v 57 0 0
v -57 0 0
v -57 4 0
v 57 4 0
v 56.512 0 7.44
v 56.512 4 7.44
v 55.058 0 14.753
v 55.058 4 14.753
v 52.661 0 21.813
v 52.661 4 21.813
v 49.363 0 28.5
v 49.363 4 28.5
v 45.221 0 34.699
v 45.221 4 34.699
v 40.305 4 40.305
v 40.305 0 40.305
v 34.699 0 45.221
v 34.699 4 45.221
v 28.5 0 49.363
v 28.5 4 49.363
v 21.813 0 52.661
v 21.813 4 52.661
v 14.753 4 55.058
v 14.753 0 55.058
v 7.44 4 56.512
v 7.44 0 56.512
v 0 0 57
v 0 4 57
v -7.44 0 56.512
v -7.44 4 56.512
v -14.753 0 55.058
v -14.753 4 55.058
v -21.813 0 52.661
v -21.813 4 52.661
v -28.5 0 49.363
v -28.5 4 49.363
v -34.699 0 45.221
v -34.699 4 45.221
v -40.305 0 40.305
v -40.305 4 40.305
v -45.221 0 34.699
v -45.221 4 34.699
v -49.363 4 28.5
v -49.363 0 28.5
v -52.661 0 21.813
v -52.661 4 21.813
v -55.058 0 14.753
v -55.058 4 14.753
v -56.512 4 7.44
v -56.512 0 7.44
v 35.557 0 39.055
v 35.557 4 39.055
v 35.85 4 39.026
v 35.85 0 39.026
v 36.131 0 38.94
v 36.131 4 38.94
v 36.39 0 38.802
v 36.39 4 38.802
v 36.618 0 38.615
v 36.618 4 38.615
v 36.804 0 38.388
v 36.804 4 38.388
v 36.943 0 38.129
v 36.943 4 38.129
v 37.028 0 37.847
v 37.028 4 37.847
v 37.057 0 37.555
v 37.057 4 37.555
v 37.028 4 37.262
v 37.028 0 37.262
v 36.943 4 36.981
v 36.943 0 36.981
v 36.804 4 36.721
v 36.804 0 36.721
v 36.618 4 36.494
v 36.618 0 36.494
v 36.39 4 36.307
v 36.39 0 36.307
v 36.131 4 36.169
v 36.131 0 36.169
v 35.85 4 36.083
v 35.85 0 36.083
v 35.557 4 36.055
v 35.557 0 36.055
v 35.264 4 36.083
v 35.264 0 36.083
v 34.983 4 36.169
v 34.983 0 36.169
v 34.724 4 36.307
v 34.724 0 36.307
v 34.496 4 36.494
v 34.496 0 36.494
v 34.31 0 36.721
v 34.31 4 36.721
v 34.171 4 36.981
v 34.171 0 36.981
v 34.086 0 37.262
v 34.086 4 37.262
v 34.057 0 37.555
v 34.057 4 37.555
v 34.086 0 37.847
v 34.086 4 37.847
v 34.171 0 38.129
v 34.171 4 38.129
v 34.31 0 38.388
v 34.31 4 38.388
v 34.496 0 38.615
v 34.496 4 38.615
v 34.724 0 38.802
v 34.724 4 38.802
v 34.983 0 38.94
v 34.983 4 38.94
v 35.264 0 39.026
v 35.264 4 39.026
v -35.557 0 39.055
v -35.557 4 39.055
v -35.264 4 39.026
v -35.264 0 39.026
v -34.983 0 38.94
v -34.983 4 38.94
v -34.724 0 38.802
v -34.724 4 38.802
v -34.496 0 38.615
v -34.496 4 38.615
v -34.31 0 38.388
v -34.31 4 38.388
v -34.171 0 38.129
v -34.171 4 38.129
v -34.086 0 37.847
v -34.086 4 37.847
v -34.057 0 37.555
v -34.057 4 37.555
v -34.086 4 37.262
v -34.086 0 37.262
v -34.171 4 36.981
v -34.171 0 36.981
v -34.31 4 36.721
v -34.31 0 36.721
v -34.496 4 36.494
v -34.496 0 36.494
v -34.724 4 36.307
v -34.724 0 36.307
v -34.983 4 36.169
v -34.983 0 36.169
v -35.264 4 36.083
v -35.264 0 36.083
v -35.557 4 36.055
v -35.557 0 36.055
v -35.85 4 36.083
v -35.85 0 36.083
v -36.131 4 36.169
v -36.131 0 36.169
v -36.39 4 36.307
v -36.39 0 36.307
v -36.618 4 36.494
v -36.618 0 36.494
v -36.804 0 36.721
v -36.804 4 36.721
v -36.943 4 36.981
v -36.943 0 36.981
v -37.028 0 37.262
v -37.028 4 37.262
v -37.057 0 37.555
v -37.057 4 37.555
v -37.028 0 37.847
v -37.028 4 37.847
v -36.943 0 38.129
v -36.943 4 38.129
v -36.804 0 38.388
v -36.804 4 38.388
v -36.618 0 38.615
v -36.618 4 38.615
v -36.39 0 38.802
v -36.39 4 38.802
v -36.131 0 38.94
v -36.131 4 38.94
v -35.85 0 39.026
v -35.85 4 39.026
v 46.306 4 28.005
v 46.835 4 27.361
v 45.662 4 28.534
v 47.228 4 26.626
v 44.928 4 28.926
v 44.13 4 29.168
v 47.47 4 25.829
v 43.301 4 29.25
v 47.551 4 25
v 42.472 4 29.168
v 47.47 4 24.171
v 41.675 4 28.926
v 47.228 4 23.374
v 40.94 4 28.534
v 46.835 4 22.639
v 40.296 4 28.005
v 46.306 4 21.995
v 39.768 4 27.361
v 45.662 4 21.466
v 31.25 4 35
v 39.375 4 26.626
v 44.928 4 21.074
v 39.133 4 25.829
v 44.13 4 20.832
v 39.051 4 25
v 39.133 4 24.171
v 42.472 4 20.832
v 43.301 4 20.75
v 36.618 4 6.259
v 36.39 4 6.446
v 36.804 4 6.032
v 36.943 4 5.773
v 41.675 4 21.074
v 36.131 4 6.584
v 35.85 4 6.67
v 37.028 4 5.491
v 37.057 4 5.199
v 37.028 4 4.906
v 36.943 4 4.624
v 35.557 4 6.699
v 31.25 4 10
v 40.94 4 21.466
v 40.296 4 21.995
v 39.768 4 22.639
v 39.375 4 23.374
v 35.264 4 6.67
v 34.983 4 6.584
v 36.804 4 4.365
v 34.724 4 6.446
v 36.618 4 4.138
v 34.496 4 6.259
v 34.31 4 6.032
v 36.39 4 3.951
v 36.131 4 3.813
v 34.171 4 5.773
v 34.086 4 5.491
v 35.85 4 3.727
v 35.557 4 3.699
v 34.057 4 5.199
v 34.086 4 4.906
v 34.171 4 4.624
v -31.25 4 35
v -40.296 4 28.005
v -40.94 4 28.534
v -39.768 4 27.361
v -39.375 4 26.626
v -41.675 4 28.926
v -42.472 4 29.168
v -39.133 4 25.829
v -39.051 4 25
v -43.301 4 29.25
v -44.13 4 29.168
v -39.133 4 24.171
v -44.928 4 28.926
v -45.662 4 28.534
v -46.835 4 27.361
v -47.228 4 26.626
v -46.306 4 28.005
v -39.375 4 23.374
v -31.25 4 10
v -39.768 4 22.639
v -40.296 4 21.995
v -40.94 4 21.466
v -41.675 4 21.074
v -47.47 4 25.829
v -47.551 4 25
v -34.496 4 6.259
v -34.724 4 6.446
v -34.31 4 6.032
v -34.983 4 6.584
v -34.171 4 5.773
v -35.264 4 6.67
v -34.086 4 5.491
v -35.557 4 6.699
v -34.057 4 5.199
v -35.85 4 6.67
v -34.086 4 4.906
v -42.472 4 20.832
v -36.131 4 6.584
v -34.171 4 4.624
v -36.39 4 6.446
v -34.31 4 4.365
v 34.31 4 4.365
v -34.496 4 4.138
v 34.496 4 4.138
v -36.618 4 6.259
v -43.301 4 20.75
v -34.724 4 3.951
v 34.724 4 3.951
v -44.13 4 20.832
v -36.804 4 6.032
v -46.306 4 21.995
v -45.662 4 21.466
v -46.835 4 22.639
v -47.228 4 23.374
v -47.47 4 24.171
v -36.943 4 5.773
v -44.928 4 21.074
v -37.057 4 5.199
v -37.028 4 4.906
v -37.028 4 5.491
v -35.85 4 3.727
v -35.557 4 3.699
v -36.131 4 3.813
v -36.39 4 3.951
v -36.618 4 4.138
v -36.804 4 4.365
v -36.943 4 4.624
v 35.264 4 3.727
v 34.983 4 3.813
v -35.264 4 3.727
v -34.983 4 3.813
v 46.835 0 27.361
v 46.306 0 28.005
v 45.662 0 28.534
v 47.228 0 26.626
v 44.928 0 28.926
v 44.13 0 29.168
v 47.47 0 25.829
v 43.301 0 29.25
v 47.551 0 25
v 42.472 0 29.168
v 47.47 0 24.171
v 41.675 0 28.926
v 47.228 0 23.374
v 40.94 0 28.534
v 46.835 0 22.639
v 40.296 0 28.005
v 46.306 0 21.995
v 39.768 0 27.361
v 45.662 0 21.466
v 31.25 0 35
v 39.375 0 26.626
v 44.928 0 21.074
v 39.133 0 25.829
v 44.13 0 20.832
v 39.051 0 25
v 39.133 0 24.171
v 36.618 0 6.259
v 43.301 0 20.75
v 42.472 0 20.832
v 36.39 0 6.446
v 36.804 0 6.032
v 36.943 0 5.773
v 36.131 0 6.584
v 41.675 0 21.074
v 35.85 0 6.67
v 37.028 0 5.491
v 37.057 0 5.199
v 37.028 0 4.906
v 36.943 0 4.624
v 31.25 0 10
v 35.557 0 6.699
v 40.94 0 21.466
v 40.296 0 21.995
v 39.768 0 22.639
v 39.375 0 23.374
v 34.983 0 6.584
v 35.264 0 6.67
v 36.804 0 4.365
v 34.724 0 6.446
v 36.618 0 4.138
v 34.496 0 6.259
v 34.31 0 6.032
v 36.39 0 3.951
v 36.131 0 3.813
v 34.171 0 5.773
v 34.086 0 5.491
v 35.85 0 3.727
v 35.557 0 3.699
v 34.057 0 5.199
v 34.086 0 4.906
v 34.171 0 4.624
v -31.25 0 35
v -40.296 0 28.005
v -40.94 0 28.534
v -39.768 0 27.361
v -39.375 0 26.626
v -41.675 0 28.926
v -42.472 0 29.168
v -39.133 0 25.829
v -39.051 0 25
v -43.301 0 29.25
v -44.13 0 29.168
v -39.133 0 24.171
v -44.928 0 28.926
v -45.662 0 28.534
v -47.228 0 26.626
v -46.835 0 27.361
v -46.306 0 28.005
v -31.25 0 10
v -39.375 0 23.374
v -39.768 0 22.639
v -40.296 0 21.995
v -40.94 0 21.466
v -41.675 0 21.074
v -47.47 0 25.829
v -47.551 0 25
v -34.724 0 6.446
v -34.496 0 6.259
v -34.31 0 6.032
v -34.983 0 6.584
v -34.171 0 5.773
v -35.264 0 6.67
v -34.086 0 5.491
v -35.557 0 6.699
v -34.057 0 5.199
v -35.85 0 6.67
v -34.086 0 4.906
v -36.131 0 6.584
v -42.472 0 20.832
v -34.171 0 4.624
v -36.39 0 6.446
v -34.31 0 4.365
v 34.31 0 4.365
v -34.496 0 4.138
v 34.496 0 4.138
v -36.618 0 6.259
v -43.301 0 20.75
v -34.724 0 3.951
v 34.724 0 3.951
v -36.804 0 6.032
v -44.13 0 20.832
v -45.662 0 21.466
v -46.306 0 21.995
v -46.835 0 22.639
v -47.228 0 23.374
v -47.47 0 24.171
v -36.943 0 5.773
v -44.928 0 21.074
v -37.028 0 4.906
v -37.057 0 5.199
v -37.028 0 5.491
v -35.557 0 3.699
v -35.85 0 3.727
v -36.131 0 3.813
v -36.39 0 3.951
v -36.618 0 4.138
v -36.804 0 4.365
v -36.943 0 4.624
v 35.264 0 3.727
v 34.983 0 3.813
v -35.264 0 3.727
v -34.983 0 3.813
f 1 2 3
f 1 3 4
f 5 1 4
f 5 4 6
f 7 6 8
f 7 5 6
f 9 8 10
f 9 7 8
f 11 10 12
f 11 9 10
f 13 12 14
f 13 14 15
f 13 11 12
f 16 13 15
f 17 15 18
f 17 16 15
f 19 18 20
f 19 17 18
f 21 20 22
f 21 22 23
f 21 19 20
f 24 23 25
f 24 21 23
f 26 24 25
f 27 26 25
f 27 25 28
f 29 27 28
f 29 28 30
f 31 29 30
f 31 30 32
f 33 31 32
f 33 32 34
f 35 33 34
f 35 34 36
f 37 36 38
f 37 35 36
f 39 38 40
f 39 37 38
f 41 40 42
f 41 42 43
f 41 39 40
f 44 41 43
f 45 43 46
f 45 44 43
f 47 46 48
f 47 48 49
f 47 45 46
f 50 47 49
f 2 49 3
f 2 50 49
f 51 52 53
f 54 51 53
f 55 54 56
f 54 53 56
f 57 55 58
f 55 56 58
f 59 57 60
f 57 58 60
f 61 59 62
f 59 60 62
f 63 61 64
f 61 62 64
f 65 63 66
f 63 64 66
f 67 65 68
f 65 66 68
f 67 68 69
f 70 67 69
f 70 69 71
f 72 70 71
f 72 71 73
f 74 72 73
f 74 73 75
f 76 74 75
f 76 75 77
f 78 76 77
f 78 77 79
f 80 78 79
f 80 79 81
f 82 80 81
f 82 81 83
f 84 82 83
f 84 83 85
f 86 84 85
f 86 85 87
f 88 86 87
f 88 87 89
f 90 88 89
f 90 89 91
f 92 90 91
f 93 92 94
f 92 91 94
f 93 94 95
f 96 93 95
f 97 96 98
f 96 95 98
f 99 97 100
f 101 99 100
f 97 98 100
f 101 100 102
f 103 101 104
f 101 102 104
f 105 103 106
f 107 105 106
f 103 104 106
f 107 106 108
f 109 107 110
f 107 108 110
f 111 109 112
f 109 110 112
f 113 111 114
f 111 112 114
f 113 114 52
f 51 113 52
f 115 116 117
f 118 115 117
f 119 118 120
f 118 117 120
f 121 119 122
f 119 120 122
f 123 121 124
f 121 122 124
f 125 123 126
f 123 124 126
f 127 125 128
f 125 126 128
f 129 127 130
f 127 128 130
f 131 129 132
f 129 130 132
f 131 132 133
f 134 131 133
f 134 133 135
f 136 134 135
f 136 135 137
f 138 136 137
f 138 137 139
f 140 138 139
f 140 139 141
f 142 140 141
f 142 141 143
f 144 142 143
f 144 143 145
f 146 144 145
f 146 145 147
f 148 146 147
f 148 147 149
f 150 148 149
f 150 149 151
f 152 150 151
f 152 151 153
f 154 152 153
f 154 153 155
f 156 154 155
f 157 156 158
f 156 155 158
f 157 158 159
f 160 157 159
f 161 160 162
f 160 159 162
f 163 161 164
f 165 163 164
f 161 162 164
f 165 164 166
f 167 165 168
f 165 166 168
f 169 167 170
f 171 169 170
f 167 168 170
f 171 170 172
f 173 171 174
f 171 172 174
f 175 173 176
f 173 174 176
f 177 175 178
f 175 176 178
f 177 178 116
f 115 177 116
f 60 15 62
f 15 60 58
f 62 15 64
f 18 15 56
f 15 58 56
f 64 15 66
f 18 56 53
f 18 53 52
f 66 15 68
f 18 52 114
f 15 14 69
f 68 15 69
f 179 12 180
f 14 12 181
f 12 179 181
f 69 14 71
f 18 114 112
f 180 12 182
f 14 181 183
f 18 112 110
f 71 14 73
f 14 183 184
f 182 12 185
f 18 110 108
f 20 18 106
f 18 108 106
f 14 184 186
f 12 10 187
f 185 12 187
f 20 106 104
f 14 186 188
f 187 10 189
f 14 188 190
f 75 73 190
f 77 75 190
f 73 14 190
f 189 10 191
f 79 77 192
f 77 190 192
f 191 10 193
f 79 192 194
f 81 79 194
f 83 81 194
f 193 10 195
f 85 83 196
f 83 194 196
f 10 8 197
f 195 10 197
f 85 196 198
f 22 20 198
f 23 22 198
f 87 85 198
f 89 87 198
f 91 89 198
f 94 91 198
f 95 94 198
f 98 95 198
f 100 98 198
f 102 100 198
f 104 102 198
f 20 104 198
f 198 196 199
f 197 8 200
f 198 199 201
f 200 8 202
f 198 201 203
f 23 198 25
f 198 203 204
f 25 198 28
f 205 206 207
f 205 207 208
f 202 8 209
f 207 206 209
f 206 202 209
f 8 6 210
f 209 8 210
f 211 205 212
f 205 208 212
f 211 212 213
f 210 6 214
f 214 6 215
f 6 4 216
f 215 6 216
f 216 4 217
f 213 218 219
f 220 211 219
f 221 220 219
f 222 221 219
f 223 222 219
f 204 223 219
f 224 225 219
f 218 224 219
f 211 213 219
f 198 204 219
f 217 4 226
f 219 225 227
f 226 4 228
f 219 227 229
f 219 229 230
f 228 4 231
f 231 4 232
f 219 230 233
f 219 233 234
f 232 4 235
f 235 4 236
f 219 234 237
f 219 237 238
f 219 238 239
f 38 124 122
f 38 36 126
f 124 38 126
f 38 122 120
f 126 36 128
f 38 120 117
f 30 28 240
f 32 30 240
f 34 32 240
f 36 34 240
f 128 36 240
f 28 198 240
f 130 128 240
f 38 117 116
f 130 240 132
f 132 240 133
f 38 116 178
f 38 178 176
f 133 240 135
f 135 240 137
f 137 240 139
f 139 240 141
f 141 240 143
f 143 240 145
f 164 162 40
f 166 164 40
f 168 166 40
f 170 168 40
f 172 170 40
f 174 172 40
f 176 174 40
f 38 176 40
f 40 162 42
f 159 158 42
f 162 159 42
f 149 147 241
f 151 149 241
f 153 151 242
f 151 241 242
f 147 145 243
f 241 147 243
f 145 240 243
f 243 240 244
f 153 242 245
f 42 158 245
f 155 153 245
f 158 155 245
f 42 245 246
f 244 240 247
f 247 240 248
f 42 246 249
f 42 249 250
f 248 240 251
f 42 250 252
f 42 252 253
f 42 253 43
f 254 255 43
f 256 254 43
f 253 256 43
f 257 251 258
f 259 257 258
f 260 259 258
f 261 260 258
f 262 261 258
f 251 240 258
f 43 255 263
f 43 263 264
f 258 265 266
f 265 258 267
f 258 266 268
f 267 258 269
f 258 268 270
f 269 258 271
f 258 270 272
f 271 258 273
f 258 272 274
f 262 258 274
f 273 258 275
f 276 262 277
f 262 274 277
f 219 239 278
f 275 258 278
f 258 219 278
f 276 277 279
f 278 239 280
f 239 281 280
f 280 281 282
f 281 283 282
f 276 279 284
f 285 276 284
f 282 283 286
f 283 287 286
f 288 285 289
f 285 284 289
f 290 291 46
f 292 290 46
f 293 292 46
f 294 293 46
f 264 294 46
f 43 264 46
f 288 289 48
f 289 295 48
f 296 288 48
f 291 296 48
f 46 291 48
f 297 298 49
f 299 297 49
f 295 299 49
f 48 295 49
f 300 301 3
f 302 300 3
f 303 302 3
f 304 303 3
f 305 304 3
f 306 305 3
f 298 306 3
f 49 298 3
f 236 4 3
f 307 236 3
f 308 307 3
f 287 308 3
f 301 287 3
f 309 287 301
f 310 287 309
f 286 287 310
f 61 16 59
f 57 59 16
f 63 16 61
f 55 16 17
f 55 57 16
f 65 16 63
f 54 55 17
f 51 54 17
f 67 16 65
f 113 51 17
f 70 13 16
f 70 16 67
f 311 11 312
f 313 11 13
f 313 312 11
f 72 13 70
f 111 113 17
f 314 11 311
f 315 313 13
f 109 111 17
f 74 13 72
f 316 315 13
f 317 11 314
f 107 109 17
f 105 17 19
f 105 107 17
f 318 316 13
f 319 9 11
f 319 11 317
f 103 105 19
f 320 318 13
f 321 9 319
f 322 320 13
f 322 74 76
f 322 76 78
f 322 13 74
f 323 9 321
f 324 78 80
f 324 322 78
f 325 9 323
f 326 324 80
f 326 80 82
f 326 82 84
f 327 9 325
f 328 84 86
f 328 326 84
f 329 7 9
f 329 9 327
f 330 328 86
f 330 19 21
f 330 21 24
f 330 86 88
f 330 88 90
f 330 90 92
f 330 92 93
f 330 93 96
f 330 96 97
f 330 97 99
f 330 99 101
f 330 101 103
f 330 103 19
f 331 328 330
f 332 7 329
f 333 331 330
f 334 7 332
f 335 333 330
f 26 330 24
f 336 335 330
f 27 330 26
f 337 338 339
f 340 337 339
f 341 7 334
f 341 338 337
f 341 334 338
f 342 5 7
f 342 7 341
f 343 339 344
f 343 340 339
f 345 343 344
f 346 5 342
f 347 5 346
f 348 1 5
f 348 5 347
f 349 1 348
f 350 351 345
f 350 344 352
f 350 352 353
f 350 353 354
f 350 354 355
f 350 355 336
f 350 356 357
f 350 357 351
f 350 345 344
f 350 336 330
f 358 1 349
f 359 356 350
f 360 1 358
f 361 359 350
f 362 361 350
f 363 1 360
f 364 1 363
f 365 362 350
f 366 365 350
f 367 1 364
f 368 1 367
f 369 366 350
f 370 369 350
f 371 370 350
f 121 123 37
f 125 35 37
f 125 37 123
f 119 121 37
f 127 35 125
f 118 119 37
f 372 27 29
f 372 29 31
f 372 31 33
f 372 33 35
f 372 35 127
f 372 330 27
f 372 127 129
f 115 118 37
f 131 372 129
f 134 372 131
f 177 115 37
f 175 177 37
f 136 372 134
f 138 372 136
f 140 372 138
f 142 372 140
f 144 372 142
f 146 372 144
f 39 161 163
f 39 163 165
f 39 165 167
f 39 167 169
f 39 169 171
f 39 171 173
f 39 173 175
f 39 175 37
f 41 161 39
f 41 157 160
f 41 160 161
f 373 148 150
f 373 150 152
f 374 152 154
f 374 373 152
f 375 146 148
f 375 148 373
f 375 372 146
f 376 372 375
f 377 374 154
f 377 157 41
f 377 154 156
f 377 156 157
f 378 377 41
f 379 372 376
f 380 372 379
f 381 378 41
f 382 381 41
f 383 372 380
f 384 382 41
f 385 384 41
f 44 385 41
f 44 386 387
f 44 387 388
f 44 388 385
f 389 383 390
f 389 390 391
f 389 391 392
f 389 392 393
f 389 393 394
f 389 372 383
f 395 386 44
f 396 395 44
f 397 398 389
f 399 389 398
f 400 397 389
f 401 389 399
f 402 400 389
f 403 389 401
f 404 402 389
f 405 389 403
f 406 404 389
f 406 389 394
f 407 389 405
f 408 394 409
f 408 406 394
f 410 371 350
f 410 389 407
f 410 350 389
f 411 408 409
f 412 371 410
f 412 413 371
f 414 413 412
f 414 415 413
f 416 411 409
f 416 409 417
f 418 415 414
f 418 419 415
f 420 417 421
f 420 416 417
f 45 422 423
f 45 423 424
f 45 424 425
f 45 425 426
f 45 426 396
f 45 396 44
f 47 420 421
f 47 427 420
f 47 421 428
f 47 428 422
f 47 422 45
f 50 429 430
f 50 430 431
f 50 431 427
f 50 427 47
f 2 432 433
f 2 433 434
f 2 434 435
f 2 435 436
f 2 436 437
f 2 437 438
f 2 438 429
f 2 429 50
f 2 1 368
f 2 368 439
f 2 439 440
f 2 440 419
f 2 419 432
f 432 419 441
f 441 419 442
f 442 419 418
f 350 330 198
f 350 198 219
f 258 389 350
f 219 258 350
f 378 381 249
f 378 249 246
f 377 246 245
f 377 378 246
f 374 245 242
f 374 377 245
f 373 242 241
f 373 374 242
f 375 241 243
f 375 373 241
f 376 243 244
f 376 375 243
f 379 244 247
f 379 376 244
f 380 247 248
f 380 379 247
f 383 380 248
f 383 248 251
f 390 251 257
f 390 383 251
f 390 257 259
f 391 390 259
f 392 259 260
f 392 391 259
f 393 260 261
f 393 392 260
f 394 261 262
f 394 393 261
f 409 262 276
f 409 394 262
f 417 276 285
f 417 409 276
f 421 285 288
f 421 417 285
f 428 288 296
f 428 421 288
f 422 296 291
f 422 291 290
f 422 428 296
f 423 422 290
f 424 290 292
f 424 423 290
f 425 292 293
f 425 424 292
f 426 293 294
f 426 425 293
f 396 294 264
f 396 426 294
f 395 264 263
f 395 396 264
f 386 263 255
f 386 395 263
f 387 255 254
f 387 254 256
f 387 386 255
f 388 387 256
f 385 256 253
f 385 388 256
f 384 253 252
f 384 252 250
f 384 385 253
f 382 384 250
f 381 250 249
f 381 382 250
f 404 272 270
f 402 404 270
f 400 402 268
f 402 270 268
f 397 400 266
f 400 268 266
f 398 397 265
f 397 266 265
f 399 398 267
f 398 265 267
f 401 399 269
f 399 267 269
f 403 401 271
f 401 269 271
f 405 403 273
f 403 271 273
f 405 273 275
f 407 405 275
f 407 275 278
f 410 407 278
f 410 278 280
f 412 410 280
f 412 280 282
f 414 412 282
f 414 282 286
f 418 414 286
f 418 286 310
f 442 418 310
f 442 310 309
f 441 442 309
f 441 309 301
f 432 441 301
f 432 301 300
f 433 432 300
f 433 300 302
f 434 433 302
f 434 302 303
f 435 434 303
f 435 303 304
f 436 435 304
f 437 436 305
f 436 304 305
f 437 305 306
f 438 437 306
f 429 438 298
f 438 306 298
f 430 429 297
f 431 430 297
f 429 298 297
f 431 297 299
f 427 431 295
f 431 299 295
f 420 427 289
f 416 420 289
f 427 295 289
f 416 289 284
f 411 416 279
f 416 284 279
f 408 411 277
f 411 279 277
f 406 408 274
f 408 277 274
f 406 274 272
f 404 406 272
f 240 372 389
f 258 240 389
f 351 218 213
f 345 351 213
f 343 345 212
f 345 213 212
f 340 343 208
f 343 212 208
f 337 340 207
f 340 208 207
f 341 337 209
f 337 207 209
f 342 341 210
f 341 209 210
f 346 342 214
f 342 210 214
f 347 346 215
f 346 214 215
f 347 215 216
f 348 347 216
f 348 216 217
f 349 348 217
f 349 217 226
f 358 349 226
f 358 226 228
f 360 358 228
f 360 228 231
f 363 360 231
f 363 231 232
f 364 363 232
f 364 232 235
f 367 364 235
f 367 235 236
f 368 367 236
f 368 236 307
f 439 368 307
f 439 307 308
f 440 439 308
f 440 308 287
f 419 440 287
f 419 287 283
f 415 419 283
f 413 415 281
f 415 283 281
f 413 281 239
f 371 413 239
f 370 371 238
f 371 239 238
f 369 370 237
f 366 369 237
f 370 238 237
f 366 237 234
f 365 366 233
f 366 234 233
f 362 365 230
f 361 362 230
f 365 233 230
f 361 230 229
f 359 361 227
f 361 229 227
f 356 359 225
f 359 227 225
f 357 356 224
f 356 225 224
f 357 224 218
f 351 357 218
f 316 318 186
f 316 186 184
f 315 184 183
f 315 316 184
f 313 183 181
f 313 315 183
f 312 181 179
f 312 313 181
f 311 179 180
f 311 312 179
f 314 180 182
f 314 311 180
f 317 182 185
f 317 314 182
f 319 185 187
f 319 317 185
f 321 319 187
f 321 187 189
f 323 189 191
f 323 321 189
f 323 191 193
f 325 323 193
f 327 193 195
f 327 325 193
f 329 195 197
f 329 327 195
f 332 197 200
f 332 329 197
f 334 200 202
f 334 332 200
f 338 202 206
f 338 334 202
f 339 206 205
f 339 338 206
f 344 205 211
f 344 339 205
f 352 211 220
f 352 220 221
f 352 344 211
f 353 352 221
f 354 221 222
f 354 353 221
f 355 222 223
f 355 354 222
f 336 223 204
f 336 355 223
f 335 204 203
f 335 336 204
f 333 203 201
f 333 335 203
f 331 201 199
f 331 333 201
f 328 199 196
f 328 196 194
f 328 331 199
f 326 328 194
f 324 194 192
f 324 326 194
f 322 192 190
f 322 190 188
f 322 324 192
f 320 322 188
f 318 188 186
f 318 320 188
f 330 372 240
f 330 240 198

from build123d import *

# Parameters (mm, degrees)
ESQUISSE1_R             = 4.25
ESQUISSE1_W             = 62.5
ESQUISSE1_H             = 25
BOSS_EXTRU_1_DEPTH      = 4
ESQUISSE2_R             = 1.5
ENL_V_MAT_EXTRU_1_DEPTH = 81.709355096


with BuildPart() as part:
    # Esquisse1 → Boss.-Extru.1 (new body)
    with BuildSketch(Plane(origin=(0, 0, 0), x_dir=(1, 0, 0), z_dir=(0, 1, 0))):
        with BuildLine():
            Line((-57, 0), (57, 0))
            ThreePointArc((57, 0), (0, -57), (-57, 0))
        make_face()
        with Locations(Location((-43.301270189, -25, 0), (0, 0, 270))):
            Circle(ESQUISSE1_R, mode=Mode.SUBTRACT)
        with Locations(Location((43.301270189, -25, 0), (0, 0, 270))):
            Circle(ESQUISSE1_R, mode=Mode.SUBTRACT)
        with Locations((0, -22.5)):
            Rectangle(ESQUISSE1_W, ESQUISSE1_H, mode=Mode.SUBTRACT)
    extrude(amount=BOSS_EXTRU_1_DEPTH)

    # Esquisse2 → Enlèv. mat.-Extru.1 (cut, through all)
    with BuildSketch(Plane(origin=(0, 4, 0), x_dir=(1, 0, 0), z_dir=(0, 1, 0))):
        with Locations(Location((-35.557071612, -37.554578926, 0), (0, 0, 270))):
            Circle(ESQUISSE2_R)
        with Locations(Location((-35.557071612, -5.198506408, 0), (0, 0, 270))):
            Circle(ESQUISSE2_R)
        with Locations(Location((35.557071612, -5.198506408, 0), (0, 0, 270))):
            Circle(ESQUISSE2_R)
        with Locations(Location((35.557071612, -37.554578926, 0), (0, 0, 270))):
            Circle(ESQUISSE2_R)
    extrude(amount=-ENL_V_MAT_EXTRU_1_DEPTH, mode=Mode.SUBTRACT)


solid = part.part
